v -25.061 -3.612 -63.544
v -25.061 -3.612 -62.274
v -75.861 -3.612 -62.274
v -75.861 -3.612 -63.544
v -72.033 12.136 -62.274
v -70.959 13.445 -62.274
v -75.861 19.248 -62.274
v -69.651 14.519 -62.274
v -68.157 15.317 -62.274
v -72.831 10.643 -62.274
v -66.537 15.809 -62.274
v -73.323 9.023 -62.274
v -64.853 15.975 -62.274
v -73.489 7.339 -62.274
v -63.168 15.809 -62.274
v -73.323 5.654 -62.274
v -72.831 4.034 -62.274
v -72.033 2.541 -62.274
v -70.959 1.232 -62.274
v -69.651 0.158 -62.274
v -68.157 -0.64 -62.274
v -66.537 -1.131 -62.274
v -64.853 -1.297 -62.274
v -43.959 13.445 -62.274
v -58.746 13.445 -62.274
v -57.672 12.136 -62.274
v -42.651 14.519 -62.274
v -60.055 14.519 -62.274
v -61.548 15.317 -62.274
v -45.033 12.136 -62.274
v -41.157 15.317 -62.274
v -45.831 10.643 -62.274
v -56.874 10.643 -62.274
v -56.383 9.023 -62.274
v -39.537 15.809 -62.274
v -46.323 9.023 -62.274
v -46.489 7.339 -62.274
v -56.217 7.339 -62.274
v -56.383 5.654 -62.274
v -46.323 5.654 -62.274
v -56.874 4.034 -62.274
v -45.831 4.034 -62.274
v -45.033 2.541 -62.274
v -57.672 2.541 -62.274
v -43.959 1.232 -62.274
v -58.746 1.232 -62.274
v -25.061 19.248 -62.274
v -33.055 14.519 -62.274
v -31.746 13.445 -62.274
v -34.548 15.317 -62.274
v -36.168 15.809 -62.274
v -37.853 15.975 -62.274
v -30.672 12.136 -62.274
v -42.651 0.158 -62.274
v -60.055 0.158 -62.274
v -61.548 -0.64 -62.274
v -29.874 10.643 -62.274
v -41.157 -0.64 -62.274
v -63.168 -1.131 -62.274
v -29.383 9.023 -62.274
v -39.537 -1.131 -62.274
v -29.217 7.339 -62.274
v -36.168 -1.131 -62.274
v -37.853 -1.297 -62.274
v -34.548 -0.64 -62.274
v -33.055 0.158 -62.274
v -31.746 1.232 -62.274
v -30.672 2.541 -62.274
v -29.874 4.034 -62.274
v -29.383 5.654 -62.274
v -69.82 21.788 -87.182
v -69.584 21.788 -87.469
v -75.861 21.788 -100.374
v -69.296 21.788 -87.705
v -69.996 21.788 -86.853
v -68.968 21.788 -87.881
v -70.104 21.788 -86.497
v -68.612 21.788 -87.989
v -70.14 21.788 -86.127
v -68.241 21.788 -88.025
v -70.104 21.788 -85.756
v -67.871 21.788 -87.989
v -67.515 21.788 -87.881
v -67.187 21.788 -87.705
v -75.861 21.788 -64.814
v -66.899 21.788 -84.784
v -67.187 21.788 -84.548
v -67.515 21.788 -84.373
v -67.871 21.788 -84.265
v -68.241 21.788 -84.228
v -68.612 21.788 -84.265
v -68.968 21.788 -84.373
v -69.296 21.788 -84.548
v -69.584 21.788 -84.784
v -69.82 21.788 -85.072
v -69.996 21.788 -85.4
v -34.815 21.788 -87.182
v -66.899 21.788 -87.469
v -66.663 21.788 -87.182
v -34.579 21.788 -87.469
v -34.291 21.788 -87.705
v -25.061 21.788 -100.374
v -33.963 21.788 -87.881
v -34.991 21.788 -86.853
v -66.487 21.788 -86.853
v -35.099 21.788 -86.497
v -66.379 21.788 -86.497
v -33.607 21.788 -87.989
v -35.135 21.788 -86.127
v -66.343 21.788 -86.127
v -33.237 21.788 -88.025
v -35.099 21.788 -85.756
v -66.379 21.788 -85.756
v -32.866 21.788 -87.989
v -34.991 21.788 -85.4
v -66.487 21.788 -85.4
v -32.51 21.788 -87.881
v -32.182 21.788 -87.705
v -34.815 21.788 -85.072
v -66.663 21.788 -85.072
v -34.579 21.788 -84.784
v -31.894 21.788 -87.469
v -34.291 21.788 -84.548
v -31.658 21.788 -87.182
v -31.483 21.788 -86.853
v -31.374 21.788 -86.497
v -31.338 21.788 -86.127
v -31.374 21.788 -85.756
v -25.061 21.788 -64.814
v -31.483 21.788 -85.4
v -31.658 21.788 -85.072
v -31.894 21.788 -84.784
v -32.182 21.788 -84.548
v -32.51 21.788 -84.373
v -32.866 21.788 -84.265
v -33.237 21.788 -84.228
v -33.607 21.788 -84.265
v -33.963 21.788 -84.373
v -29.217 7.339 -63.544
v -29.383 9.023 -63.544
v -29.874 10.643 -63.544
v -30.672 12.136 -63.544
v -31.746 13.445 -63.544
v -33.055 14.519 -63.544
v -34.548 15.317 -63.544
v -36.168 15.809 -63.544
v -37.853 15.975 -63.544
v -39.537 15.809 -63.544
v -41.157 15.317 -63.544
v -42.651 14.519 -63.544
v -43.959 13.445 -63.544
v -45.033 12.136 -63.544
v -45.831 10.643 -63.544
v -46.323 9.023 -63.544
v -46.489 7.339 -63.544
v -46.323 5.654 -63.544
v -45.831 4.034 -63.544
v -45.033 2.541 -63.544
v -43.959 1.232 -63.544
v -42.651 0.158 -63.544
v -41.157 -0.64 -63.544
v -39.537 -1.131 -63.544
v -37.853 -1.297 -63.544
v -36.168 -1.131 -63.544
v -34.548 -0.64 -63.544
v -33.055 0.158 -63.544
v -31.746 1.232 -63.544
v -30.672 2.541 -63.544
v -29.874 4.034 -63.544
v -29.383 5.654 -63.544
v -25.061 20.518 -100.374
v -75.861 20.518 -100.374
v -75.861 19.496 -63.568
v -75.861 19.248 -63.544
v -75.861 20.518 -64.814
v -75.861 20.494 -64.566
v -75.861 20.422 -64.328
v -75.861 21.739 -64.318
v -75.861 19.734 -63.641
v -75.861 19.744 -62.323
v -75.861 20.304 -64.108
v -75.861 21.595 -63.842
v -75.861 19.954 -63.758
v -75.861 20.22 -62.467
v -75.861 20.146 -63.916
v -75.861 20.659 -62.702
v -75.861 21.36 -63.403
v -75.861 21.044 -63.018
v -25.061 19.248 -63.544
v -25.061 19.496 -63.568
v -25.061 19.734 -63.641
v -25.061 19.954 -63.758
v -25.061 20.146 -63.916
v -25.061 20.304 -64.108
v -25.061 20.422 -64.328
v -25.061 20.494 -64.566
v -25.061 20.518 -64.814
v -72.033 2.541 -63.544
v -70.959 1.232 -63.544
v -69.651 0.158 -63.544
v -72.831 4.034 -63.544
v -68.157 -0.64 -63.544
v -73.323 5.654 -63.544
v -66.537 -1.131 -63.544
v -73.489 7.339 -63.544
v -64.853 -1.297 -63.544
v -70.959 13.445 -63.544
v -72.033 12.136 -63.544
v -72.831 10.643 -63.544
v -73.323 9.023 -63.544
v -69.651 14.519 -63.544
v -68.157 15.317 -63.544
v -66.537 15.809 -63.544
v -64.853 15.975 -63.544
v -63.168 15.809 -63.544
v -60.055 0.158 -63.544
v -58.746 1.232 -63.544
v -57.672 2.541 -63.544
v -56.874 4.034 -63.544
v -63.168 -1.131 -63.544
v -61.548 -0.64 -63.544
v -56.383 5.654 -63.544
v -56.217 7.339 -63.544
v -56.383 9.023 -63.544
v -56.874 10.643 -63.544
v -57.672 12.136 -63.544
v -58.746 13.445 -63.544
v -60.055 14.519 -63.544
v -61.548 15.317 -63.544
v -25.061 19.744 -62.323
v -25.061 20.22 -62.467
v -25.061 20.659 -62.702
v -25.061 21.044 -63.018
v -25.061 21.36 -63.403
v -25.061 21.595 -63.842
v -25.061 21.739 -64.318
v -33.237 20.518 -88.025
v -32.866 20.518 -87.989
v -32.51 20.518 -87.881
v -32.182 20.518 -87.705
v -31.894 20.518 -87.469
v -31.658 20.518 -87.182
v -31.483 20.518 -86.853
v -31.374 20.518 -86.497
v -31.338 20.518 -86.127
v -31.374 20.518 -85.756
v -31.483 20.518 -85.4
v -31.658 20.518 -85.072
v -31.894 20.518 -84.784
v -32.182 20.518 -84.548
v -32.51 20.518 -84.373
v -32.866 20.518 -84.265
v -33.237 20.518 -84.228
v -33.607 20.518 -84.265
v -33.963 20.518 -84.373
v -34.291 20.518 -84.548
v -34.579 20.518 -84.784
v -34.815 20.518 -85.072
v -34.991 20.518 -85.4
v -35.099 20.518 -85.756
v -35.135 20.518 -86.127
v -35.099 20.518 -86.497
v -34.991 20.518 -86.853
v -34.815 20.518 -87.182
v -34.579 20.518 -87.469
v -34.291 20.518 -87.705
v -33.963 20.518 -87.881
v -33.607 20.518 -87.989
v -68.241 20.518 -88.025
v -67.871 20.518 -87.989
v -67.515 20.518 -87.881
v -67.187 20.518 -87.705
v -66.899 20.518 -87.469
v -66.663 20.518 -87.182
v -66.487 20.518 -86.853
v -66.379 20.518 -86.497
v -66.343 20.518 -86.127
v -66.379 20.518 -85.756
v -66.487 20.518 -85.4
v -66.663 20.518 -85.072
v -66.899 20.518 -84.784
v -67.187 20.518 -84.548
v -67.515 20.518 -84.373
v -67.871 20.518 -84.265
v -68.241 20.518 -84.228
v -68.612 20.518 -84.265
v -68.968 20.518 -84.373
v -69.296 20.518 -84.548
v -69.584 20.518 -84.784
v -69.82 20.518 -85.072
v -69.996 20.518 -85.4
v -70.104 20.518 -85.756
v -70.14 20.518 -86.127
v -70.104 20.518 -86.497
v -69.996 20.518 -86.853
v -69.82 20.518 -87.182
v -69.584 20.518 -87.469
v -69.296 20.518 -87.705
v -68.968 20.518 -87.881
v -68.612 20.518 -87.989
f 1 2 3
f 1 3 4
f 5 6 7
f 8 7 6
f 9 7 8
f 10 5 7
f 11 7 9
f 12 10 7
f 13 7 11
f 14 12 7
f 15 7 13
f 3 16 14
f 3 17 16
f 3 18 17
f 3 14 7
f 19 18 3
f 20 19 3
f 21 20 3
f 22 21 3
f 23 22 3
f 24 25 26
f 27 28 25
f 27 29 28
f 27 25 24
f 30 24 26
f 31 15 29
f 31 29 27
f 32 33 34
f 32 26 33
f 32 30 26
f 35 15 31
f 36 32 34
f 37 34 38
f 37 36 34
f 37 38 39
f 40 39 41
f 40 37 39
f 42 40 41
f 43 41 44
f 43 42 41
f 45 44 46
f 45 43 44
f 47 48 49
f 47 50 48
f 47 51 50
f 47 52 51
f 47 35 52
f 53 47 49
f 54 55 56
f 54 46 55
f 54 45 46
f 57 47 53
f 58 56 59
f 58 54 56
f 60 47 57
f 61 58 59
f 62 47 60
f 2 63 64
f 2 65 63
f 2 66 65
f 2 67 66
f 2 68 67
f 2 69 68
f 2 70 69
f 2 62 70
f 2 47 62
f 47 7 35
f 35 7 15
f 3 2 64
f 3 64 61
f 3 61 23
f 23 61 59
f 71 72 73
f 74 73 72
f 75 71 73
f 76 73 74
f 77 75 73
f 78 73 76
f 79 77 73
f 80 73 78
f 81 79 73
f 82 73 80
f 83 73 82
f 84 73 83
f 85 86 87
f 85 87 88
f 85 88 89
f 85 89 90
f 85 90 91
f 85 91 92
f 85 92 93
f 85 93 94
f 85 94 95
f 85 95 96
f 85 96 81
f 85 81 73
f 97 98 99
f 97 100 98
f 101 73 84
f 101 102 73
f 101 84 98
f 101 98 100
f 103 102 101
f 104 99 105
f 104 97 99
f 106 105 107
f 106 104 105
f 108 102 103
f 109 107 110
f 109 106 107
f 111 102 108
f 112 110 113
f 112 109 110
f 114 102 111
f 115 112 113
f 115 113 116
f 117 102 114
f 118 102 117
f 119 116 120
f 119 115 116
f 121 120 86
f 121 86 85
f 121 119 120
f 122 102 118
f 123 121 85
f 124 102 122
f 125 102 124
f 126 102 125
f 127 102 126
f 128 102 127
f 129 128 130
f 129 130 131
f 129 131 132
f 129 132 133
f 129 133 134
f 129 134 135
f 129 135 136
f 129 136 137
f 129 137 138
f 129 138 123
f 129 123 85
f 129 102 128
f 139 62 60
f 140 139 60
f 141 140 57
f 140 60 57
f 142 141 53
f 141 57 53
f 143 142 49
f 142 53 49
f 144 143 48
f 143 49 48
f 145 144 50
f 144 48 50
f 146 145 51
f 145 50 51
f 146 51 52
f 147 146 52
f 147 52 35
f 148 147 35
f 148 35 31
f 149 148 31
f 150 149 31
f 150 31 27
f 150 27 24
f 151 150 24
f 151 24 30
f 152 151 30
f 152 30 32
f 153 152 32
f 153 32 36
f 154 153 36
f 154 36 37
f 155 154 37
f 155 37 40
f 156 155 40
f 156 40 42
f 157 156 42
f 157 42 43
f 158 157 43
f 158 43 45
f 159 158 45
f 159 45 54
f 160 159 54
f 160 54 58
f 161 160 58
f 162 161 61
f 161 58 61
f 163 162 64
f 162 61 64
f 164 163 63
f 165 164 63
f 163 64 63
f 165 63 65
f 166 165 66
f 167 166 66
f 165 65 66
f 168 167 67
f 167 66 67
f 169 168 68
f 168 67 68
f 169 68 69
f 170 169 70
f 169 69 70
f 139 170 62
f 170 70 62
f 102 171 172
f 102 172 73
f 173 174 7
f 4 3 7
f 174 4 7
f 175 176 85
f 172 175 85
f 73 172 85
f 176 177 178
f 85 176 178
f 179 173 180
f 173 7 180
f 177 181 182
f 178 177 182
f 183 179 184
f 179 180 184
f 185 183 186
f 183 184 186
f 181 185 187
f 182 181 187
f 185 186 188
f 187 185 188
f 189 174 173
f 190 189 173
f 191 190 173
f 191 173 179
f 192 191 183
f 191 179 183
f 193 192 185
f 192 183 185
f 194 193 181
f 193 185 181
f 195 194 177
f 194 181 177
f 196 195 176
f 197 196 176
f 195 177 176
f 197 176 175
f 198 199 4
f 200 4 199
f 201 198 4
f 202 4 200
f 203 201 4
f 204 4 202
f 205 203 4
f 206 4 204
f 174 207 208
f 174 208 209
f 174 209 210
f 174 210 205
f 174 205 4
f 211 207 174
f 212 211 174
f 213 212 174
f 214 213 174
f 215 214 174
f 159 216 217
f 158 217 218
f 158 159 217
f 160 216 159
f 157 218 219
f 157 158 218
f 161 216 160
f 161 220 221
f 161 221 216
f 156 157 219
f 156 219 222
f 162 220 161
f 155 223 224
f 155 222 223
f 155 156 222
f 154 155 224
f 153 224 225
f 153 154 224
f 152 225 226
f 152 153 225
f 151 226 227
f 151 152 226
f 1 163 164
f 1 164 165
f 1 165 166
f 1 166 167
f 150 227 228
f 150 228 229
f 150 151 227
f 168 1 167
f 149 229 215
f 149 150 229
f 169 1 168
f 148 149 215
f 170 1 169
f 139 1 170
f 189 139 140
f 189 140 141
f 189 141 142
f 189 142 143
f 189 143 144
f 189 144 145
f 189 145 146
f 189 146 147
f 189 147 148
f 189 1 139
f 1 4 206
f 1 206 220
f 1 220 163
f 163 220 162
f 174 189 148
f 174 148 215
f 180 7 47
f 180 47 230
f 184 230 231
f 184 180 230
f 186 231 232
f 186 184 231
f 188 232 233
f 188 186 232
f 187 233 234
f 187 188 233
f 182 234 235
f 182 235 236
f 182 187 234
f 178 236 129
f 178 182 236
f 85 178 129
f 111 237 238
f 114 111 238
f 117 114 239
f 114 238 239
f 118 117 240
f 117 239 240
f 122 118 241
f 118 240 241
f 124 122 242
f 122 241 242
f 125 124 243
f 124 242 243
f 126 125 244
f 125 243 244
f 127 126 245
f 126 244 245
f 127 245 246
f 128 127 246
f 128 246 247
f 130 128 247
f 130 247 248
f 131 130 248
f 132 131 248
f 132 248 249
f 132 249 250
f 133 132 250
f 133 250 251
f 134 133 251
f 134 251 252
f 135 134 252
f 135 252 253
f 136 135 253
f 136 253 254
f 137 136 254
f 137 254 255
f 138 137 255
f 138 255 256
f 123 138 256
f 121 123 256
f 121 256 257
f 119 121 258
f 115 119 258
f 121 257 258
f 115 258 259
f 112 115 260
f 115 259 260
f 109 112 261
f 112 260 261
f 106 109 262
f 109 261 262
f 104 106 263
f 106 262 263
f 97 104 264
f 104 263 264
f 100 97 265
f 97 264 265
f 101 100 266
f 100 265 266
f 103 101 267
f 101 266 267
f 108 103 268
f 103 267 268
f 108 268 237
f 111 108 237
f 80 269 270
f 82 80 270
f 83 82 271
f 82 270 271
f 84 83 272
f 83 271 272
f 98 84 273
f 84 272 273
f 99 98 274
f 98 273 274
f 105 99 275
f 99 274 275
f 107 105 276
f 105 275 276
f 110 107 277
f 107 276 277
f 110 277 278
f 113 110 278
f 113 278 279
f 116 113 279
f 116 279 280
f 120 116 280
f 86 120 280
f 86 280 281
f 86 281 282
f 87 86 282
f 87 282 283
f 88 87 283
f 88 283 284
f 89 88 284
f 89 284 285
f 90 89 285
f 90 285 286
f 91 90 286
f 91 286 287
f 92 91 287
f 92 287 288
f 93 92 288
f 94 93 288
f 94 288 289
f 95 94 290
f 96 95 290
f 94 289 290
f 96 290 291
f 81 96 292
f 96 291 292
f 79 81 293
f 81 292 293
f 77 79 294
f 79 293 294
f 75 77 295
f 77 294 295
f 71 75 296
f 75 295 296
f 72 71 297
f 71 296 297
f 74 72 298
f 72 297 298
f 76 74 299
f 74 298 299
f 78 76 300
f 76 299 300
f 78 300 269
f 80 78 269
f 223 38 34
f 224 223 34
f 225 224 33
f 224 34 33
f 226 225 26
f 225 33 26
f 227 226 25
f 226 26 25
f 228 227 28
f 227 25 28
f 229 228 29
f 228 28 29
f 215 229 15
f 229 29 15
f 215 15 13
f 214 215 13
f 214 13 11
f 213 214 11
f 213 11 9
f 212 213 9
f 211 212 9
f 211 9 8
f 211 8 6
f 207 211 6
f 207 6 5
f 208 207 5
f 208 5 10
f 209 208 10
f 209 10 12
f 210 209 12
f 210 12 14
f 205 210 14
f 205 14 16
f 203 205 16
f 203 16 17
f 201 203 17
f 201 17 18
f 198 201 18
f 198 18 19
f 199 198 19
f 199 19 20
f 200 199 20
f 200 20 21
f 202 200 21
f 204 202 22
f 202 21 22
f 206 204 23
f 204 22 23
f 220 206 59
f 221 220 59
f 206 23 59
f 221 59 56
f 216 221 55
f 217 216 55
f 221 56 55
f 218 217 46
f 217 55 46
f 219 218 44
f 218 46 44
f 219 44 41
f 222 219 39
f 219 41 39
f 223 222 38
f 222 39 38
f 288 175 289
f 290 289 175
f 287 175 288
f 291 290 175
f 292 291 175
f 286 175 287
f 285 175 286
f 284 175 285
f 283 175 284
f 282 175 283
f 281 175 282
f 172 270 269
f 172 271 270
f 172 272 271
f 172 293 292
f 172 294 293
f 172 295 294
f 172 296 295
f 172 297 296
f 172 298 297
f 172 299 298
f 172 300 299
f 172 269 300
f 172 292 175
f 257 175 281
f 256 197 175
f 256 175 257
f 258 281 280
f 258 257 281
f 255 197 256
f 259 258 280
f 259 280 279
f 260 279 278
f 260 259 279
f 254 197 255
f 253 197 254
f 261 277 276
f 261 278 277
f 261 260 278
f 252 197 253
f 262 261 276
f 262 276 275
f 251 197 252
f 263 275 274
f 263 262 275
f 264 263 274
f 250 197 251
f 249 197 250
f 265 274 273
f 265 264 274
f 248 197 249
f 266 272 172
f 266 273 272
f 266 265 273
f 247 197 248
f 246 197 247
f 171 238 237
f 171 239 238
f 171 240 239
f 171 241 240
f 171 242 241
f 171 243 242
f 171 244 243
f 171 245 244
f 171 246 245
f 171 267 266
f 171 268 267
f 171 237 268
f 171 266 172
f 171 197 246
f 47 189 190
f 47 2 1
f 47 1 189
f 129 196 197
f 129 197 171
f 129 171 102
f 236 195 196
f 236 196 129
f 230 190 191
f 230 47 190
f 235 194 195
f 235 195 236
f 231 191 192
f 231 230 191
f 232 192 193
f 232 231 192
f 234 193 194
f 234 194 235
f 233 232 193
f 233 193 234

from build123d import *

# Parameters (mm, degrees)
BOSS_EXTRUDE1_DEPTH    = 50.8
SKETCH2_R              = 8.636
CUT_EXTRUDE1_DEPTH     = 88.642940525
CONVERT_SOLID1_START   = -75.861380996
CONVERT_SOLID1_DEPTH   = 50.8
CONVERT_SOLID1_2_DEPTH = 50.8
SKETCH7_R              = 1.89865
CUT_EXTRUDE2_DEPTH     = 129.109840672


# Read off the part's stored shape, not the designer's step: Convert-Solid1
with BuildPart() as part:
    # Sketch1 → Boss-Extrude1 (new body)
    with BuildSketch(Plane(origin=(-25.061380996, 0, 0), x_dir=(0, 0, -1), z_dir=(1, 0, 0))):
        Polygon((63.543927145, -3.611794537), (63.543927145, 20.518205463), (100.373927145, 20.518205463), (100.373927145, 21.788205463), (62.273927145, 21.788205463), (62.273927145, -3.611794537), align=None)
    extrude(amount=-BOSS_EXTRUDE1_DEPTH)

    # Sketch2 → Cut-Extrude1 (cut, through all)
    with BuildSketch(Plane.XY.offset(-62.273927145)):
        with Locations((-64.852637296, 7.338590118)):
            Circle(SKETCH2_R)
        with Locations((-37.852637296, 7.338590118)):
            Circle(SKETCH2_R)
    extrude(amount=-CUT_EXTRUDE1_DEPTH, mode=Mode.SUBTRACT)

    # Convert-Solid1 outline → Convert-Solid1 (cut)
    with BuildSketch(Plane.YZ.offset(CONVERT_SOLID1_START)):
        with BuildLine():
            Line((21.788205463, -62.273927145), (19.248205463, -62.273927145))
            ThreePointArc((19.248205463, -62.273927145), (21.044256687, -63.01787592), (21.788205463, -64.813927145))
            Line((21.788205463, -64.813927145), (21.788205463, -62.273927145))
        make_face()
    extrude(amount=CONVERT_SOLID1_DEPTH, mode=Mode.SUBTRACT)

    # Convert-Solid1 2 outline → Convert-Solid1 2 (add)
    with BuildSketch(Plane.YZ.offset(CONVERT_SOLID1_START)):
        with BuildLine():
            Line((20.518205463, -63.543927145), (19.248205463, -63.543927145))
            ThreePointArc((19.248205463, -63.543927145), (20.146231075, -63.915901533), (20.518205463, -64.813927145))
            Line((20.518205463, -64.813927145), (20.518205463, -63.543927145))
        make_face()
    extrude(amount=CONVERT_SOLID1_2_DEPTH)

    # Sketch7 → Cut-Extrude2 (cut, through all)
    with BuildSketch(Plane(origin=(0, 20.518205463, 0), x_dir=(-1, 0, 0), z_dir=(0, -1, 0))):
        with Locations(Location((68.241380996, 86.126775189, 0), (0, 0, 90))):
            Circle(SKETCH7_R)
        with Locations(Location((33.236646392, 86.126775189, 0), (0, 0, 90))):
            Circle(SKETCH7_R)
    extrude(amount=-CUT_EXTRUDE2_DEPTH, mode=Mode.SUBTRACT)


solid = part.part
